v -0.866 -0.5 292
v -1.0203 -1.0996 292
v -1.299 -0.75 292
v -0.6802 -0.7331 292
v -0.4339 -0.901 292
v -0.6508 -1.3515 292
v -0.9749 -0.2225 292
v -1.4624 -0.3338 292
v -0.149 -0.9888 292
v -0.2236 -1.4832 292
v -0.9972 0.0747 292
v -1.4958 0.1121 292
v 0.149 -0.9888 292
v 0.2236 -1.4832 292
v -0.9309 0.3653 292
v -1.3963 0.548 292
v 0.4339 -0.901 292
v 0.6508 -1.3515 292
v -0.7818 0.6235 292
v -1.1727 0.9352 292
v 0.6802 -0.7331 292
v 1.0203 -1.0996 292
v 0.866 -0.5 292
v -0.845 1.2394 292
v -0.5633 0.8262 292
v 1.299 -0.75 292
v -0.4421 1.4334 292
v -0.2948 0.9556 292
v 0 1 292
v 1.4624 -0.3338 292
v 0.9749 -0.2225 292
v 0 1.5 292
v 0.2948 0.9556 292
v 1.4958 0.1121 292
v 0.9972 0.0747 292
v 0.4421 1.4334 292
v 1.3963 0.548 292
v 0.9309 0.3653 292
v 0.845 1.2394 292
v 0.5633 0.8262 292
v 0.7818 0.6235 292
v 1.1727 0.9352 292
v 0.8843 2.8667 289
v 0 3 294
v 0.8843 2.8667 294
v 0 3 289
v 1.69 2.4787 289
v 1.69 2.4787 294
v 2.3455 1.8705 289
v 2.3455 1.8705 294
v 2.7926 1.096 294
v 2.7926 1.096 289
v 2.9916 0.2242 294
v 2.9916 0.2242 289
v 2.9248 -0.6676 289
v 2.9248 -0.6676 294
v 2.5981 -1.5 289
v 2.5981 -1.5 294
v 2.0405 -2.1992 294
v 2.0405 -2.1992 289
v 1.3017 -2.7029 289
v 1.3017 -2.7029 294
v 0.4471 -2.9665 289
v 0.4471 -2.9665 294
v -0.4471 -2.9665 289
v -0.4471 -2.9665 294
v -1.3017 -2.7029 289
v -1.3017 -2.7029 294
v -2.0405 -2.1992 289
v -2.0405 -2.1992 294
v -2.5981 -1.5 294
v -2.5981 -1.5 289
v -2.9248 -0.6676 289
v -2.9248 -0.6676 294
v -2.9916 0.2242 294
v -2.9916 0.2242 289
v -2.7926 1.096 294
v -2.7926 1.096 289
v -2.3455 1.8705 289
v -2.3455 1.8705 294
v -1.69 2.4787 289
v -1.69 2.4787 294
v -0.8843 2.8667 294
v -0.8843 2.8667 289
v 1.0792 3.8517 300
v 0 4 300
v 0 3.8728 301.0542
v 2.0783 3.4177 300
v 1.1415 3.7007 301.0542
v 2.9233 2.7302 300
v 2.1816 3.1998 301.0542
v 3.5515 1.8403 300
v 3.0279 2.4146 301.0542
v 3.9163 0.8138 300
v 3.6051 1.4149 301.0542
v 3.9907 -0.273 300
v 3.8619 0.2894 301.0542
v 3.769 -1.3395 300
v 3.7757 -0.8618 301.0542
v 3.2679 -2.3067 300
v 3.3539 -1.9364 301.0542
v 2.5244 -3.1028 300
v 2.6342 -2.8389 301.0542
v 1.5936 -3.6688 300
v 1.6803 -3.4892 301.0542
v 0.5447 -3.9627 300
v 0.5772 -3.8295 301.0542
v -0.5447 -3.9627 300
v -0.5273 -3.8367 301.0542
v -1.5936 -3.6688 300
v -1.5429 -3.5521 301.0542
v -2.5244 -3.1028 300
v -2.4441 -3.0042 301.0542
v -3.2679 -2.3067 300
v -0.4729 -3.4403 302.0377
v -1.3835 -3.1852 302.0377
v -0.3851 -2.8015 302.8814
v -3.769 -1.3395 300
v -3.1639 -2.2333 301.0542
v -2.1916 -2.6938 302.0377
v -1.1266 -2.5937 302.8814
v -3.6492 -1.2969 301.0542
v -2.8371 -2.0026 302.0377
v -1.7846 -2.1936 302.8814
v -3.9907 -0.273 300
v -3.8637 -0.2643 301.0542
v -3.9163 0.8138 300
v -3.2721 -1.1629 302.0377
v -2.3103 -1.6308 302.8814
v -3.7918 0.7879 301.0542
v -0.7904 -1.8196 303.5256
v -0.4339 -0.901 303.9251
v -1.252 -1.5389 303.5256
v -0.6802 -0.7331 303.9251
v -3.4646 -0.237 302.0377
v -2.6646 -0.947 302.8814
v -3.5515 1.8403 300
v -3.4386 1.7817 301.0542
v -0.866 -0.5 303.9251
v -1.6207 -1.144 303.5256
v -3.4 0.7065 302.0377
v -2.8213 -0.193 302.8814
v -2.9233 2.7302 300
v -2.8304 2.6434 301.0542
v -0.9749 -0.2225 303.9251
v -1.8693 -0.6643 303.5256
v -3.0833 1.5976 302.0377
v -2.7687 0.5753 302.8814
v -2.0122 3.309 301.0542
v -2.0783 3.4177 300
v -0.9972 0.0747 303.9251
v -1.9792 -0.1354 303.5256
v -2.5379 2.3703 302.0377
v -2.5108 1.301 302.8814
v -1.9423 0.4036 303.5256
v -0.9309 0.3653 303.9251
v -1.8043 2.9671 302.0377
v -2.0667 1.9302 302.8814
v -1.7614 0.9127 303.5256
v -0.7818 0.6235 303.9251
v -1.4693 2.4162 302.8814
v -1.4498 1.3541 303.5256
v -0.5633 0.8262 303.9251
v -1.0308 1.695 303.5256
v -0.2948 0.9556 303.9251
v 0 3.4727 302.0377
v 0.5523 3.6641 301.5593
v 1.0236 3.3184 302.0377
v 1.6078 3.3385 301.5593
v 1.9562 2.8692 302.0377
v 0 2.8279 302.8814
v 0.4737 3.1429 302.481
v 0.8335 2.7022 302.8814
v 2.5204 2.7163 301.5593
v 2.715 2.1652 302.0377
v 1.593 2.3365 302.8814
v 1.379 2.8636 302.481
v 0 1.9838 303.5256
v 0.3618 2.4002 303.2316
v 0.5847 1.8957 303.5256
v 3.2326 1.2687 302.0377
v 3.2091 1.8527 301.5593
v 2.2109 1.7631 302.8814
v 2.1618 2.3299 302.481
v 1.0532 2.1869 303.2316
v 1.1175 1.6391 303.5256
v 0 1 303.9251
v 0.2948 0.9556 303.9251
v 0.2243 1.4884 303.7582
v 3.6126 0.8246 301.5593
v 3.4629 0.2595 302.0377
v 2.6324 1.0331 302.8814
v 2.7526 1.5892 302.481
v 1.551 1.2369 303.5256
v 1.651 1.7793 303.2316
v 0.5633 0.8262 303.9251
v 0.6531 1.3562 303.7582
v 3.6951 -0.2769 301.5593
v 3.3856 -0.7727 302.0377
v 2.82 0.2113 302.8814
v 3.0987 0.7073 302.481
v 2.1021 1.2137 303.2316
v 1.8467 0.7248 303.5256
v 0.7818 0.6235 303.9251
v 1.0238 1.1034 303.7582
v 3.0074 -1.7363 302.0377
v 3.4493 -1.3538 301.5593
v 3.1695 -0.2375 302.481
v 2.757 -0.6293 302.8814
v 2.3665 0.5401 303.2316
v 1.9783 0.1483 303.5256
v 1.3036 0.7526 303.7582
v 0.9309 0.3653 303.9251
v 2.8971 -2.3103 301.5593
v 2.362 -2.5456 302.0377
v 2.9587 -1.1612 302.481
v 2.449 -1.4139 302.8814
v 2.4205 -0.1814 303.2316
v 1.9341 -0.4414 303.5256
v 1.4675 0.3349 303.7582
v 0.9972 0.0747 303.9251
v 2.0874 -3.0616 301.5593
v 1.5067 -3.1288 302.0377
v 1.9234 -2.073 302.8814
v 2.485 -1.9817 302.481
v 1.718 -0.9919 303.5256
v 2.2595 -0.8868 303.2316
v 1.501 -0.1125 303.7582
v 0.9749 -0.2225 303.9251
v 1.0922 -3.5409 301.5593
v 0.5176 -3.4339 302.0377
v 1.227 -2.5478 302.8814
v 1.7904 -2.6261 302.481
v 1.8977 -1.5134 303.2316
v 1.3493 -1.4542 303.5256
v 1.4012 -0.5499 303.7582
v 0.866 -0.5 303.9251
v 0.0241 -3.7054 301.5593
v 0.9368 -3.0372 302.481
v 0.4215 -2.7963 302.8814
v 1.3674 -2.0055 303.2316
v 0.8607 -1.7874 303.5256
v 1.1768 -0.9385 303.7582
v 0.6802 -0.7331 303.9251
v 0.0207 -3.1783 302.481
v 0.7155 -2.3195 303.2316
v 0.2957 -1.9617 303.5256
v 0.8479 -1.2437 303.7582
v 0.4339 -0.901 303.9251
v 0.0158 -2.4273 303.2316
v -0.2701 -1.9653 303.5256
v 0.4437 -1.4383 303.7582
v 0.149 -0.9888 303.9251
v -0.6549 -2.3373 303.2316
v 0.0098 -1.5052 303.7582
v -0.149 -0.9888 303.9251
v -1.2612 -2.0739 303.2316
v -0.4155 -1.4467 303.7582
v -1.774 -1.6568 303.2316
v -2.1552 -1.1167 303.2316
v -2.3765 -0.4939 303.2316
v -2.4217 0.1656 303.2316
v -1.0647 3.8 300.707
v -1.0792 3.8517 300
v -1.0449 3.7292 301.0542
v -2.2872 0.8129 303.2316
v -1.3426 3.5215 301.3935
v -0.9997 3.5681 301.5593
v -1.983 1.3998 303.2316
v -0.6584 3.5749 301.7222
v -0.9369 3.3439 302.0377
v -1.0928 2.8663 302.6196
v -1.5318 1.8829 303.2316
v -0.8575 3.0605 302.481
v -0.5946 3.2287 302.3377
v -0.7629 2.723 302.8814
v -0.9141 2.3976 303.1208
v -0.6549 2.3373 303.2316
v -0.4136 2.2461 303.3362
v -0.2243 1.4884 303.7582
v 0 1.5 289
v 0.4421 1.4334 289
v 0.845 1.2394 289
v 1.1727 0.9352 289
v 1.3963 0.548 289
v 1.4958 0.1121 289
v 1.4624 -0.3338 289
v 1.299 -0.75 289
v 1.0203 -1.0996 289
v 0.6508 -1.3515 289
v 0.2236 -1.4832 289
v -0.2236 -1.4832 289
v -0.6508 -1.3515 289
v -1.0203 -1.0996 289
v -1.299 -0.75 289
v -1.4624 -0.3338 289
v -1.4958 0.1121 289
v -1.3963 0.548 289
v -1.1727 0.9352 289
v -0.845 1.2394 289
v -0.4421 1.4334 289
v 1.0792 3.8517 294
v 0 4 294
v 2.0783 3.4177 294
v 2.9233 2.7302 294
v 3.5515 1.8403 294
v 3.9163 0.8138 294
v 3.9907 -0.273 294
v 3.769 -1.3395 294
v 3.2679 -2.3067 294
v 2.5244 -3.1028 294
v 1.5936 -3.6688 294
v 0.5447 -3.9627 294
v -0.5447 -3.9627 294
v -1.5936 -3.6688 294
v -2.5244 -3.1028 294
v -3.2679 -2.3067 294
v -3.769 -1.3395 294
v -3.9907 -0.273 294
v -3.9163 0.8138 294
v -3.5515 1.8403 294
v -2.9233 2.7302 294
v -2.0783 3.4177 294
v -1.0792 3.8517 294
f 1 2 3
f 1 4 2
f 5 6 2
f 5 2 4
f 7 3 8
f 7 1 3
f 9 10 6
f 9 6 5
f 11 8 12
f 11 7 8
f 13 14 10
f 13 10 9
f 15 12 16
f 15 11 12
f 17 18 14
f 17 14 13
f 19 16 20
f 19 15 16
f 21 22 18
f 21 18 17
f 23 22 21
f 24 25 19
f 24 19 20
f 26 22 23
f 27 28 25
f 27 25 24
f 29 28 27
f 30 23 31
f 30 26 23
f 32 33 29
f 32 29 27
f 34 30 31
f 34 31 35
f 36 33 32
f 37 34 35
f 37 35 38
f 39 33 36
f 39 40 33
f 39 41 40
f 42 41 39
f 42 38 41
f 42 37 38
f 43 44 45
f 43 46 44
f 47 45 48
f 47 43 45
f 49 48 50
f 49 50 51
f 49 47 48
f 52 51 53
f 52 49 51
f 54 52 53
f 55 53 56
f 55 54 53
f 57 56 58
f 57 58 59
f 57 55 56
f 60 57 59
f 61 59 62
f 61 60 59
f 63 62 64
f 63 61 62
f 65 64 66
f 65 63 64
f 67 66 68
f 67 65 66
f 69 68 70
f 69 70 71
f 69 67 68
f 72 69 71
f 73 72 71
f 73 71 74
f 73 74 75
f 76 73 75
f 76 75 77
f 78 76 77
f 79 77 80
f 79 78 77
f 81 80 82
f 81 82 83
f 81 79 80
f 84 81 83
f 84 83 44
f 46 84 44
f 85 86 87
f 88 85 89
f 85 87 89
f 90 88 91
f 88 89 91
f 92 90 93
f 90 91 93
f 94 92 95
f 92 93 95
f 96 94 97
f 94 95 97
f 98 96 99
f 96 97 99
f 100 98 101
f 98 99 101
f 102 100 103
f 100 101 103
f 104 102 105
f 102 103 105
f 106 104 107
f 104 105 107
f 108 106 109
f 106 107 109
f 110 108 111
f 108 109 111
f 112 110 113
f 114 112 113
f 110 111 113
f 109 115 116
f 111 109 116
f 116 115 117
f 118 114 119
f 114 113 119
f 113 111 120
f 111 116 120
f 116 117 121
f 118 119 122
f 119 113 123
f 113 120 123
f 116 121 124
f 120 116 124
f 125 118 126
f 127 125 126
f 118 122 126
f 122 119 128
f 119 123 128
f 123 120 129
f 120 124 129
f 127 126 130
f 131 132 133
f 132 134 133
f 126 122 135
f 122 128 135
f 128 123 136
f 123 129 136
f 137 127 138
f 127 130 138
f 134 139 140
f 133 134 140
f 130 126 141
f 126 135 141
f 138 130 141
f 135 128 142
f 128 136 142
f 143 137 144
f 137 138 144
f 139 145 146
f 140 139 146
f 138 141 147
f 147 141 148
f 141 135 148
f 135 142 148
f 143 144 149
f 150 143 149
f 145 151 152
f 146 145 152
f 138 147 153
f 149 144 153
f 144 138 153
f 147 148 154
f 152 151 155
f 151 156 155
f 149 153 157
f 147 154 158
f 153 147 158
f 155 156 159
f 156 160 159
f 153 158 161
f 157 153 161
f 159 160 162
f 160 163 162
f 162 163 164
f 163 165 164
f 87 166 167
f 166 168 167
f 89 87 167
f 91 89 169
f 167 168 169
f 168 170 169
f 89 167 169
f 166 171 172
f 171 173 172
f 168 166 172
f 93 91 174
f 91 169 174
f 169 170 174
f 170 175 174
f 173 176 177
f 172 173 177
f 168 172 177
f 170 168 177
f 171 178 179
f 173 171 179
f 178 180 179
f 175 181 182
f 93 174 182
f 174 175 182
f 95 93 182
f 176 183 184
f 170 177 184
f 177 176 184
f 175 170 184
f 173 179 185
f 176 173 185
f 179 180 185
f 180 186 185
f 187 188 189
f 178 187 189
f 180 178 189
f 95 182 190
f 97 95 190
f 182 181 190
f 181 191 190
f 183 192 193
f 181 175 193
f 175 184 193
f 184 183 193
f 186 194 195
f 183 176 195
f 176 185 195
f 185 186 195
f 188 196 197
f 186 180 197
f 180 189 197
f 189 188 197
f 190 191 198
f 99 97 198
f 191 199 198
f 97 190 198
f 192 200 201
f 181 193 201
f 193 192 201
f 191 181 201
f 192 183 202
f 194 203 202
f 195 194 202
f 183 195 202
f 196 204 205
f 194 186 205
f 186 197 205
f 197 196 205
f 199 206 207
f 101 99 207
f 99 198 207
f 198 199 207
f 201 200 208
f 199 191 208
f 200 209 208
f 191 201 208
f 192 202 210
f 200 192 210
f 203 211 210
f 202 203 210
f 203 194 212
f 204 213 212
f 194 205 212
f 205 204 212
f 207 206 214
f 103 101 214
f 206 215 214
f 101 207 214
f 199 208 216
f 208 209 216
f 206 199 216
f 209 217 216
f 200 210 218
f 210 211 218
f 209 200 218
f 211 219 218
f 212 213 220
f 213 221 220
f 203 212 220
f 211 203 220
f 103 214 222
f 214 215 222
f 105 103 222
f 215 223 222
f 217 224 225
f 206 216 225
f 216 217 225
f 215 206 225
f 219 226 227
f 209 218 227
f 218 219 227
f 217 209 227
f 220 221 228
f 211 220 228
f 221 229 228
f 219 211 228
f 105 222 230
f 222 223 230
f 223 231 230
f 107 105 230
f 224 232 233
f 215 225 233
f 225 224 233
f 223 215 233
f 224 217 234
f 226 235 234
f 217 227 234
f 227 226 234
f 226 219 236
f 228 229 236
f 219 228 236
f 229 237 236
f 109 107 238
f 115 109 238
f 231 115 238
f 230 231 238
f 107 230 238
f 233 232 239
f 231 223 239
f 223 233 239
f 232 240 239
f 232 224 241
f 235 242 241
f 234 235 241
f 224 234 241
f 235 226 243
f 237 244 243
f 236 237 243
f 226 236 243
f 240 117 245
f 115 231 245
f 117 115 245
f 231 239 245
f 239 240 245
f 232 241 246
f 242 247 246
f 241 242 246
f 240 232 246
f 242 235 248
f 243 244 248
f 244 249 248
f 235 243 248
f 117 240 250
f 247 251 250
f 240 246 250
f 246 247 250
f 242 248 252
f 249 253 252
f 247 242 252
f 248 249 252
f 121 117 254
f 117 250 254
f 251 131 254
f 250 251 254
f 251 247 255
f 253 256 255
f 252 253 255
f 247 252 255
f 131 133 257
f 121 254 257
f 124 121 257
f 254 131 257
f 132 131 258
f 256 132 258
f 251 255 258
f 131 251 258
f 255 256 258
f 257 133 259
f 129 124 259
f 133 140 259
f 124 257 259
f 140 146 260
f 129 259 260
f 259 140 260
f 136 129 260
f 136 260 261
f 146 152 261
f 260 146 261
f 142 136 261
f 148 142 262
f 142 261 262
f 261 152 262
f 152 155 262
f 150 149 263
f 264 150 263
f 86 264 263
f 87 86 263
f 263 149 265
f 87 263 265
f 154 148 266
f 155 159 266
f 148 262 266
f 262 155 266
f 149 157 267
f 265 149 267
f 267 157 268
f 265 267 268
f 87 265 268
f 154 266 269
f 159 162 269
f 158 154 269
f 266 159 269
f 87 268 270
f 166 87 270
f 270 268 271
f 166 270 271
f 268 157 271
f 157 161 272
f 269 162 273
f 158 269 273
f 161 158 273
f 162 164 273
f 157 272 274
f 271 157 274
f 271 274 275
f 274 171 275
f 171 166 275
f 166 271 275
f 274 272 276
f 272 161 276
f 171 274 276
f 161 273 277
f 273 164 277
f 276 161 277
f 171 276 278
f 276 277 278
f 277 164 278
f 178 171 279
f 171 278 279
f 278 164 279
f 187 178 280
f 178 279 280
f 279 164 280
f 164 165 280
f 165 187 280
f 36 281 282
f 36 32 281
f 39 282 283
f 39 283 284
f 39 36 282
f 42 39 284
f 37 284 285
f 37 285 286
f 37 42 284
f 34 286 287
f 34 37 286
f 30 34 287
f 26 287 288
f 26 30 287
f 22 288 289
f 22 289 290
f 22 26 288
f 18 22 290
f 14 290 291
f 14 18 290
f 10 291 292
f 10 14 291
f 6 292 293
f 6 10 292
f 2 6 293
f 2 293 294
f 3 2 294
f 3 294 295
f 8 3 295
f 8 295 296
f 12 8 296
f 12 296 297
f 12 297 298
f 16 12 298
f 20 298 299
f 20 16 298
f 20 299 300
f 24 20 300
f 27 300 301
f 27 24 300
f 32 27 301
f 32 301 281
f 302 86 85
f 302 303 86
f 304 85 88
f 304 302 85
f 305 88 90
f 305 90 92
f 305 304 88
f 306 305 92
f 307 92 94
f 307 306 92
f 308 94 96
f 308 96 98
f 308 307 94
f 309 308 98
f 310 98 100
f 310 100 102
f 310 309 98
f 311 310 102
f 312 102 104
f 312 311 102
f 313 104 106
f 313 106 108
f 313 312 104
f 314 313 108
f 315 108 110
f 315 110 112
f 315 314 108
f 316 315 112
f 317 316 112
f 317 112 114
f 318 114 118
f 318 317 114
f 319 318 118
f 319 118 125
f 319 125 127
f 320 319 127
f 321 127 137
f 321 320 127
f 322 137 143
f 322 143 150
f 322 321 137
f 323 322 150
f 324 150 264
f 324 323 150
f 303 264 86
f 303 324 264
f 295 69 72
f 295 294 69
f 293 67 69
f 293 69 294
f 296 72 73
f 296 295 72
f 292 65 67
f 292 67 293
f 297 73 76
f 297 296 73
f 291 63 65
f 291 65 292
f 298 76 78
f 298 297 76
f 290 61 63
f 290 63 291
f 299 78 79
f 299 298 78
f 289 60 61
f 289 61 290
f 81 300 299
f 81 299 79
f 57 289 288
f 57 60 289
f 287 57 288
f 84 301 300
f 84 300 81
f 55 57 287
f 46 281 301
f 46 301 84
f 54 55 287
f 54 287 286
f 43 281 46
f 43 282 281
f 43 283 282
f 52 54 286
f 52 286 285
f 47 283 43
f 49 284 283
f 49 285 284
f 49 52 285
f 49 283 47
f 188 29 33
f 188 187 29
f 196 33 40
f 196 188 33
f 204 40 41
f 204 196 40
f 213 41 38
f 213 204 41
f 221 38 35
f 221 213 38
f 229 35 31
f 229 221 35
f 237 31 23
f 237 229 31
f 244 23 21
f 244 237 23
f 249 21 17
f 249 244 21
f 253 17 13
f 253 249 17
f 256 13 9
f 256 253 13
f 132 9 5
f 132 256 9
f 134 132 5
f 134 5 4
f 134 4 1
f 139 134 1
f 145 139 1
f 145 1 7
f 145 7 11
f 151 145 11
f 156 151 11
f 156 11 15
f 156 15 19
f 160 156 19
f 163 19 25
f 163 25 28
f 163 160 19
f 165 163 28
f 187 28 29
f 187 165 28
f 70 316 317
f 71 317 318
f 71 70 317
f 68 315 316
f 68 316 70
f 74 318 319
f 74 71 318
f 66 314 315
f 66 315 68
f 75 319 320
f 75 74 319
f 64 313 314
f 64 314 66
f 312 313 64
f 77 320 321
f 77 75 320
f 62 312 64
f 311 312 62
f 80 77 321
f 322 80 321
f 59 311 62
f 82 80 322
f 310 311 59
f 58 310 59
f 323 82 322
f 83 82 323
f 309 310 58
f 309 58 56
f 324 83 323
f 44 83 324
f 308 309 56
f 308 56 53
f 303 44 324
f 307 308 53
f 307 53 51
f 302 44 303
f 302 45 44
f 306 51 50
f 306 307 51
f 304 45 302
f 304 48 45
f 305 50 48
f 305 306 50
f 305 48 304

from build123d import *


with BuildPart() as part:
    # Sketch → Revolution (revolve)
    with BuildSketch(Plane(origin=(0, 0, 300), x_dir=(0, 0, -1), z_dir=(1, 0, 0))):
        with BuildLine():
            Line((0, 4), (6, 4))
            Line((6, 4), (6, 3))
            Line((6, 3), (11, 3))
            Line((11, 3), (11, 1.5))
            Line((11, 1.5), (8, 1.5))
            Line((8, 1.5), (8, 1))
            Line((8, 1), (-3.925111, 1))
            ThreePointArc((0, 4), (-2.481046, 3.178377), (-3.925111, 1))
        make_face()
    revolve(axis=Axis((0, 0, 300), (0, 0, -1)))


solid = part.part
